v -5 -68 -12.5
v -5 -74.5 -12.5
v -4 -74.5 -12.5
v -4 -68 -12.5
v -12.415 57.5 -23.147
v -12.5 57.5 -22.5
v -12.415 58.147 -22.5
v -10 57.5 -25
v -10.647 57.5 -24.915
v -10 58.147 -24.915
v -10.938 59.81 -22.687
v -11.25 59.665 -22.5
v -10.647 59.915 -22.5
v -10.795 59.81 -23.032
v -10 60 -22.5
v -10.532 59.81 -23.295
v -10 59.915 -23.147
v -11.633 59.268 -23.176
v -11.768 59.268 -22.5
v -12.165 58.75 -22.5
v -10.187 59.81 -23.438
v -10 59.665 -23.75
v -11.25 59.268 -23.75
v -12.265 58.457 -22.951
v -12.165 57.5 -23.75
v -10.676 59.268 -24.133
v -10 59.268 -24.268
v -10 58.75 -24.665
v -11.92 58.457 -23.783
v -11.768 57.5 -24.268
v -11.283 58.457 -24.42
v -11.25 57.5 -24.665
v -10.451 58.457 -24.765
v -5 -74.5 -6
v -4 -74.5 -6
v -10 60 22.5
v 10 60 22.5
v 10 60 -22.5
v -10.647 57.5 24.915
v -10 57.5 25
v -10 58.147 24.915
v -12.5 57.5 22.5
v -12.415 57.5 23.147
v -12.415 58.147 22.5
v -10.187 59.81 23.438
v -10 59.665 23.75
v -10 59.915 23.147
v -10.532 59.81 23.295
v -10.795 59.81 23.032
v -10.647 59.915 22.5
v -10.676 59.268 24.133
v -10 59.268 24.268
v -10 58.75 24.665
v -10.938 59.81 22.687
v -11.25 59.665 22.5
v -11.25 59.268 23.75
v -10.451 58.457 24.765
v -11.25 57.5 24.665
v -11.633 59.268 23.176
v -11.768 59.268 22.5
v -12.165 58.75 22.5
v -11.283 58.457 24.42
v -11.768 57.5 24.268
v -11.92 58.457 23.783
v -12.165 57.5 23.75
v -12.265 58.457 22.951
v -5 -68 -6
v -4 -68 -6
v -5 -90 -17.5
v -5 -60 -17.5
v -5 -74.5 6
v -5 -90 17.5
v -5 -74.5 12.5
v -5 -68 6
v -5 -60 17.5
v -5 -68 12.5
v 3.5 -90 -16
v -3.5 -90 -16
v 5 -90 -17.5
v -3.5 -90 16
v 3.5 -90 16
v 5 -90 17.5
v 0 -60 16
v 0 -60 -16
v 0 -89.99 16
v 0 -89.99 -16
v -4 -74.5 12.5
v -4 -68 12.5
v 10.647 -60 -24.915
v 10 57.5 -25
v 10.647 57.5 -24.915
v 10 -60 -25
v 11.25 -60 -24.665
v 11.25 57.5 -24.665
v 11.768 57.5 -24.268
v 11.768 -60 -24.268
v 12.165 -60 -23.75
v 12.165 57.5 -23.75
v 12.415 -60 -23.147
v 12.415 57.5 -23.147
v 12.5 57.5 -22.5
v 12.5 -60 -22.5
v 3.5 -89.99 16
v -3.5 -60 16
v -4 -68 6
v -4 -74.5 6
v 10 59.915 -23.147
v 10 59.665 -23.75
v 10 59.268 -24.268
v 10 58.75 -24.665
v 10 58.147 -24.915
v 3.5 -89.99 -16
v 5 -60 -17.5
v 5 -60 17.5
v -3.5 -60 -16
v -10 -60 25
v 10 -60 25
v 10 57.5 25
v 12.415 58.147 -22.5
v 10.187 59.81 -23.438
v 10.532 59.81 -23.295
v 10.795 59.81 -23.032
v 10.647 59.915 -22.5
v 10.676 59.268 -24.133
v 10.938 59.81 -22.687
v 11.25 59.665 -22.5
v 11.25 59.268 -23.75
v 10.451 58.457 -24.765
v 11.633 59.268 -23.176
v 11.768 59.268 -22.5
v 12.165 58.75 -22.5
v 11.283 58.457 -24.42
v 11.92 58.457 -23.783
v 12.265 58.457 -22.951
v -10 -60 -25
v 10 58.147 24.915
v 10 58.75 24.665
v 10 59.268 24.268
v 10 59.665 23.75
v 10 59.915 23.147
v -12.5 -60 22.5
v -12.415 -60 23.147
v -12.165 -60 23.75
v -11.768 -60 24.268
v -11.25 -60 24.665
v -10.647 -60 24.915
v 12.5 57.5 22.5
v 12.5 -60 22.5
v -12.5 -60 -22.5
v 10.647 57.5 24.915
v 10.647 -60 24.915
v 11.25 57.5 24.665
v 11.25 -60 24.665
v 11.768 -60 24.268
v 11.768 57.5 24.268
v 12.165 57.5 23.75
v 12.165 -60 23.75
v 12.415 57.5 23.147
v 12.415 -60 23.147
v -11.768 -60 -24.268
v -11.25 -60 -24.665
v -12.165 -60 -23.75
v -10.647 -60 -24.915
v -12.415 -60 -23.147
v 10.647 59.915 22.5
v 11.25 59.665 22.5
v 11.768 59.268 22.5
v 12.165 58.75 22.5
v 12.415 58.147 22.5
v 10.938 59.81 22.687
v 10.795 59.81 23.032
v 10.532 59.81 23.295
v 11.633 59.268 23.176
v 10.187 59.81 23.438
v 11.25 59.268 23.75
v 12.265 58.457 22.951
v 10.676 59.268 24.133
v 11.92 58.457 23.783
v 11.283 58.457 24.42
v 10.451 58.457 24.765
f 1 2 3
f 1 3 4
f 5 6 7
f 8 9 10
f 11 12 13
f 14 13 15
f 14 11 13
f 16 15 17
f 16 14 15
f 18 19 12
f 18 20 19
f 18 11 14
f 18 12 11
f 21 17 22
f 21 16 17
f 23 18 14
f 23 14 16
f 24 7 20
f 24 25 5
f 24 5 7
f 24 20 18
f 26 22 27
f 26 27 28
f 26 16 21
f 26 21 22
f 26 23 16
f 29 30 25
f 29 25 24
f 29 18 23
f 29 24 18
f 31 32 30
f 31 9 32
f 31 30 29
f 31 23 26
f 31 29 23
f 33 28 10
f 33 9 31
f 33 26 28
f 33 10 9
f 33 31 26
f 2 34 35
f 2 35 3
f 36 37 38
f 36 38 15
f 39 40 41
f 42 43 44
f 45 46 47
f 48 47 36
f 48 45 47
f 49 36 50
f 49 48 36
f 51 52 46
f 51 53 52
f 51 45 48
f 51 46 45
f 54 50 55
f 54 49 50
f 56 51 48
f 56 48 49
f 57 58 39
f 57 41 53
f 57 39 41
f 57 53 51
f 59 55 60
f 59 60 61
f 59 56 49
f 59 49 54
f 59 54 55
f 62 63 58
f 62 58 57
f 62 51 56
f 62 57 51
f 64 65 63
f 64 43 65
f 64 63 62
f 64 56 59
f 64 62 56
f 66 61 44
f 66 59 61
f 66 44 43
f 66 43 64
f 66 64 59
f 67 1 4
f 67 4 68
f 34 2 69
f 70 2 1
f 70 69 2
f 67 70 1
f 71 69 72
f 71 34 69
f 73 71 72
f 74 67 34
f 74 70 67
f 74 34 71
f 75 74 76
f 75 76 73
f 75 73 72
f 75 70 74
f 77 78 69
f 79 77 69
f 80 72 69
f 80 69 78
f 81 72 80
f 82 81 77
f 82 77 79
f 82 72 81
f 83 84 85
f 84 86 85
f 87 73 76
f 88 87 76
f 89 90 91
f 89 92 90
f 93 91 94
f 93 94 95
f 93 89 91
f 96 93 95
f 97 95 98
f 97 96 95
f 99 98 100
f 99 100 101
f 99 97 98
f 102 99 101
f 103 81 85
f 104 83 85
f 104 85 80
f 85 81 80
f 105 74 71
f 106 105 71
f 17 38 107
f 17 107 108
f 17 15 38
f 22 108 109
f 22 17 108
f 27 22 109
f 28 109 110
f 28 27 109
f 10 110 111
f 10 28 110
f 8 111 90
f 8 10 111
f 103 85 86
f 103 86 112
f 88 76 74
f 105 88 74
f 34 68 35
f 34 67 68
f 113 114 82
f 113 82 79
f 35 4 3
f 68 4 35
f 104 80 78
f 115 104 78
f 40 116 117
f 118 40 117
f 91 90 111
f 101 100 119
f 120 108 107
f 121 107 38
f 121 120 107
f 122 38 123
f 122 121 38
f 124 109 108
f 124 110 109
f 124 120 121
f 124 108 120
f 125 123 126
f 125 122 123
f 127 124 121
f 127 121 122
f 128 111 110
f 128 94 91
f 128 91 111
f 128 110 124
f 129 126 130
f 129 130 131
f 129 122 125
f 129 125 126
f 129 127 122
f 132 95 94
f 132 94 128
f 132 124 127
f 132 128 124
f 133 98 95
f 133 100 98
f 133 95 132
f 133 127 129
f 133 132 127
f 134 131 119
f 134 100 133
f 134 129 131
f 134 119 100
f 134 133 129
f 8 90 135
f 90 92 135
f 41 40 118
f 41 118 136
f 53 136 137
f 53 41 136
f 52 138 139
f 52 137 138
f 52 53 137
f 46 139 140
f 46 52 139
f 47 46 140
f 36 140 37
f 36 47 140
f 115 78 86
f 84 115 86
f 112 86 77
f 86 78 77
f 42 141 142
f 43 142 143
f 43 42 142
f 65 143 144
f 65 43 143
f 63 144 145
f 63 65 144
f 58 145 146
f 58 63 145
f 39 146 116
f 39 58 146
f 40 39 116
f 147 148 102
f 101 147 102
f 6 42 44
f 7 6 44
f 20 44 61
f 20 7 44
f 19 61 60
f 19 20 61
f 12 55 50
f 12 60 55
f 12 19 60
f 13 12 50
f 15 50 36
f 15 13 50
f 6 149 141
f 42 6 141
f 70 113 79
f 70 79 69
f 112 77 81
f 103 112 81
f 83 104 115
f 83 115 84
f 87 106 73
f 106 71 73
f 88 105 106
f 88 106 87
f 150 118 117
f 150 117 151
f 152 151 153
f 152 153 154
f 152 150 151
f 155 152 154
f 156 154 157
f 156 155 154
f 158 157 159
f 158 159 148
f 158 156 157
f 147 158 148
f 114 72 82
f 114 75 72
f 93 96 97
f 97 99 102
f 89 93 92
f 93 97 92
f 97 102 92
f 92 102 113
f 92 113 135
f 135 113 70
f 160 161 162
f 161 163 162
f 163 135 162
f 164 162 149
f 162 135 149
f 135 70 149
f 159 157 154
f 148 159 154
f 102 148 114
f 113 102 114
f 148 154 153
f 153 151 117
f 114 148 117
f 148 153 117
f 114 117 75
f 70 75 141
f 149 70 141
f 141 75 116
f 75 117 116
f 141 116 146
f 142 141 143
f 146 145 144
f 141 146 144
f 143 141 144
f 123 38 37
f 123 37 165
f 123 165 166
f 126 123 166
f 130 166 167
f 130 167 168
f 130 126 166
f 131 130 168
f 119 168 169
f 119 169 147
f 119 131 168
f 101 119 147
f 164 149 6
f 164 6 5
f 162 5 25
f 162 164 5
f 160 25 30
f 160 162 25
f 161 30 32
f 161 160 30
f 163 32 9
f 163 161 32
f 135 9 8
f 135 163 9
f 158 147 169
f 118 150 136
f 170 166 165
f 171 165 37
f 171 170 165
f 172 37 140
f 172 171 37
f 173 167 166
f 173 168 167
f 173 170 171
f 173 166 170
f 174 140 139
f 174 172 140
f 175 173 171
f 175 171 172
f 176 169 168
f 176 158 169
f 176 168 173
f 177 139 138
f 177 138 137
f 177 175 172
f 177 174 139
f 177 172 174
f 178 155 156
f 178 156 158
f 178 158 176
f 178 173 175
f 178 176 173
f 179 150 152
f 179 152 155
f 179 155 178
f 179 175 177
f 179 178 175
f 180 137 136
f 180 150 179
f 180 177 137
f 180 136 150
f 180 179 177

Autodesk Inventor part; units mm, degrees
ref_plane "YZ Plane" through (0, 0, 0) normal (1, 0, 0) x (0, 1, 0)
ref_plane "XZ Plane" through (0, 0, 0) normal (0, 1, 0) x (-1, 0, 0)
ref_plane "XY Plane" through (0, 0, 0) normal (0, 0, 1) x (1, 0, 0)
sketch "Sketch1" plane through (0, 0, 0) normal (0, 1, 0) x (-1, 0, 0)
  line L0 (12.5, 25) -> (-12.5, 25)
  line L1 (-12.5, 25) -> (-12.5, -25)
  line L2 (-12.5, -25) -> (12.5, -25)
  line L3 (12.5, -25) -> (12.5, 25)
  line L4 (17.5, 0) -> (-17.5, 0) projected
  line L5 (0, -35) -> (0, 35) projected
  point P0 (0, 0)
  point P1 (12.5, 0)
  point P2 (0, -25)
  dimension "d0" = 50
  dimension "d1" = 25
extrude "Extrusion1" add sketch "Sketch1" along normal mid plane 120
sketch "Sketch2" plane through (0, -60, 0) normal (0, -1, 0) x (1, 0, 0)
  line L0 (-12.5, -25) -> (12.5, -25) projected
  line L1 (12.5, -25) -> (12.5, 25) projected
  line L2 (12.5, 25) -> (-12.5, 25) projected
  line L3 (-12.5, 25) -> (-12.5, -25) projected
  line L4 (5, 17.5) -> (5, -17.5)
  line L5 (5, -17.5) -> (-5, -17.5)
  line L6 (-5, -17.5) -> (-5, 17.5)
  line L7 (-5, 17.5) -> (5, 17.5)
  point P0 (0, 0)
  dimension "d4" = 10
extrude "Extrusion2" add sketch "Sketch2" along normal blind 30 contours L4 L5 L6 L7
sketch "Sketch3" plane through (0, -90, 0) normal (0, -1, 0) x (1, 0, 0)
  line L0 (5, -17.5) -> (5, 17.5) projected
  line L1 (5, 17.5) -> (-5, 17.5) projected
  line L2 (-5, 17.5) -> (-5, -17.5) projected
  line L3 (-5, -17.5) -> (5, -17.5) projected
  line L4 (-3.5, -16) -> (0, -16)
  line L5 (0, -16) -> (0, 16)
  line L6 (0, 16) -> (-3.5, 16)
  line L7 (-3.5, 16) -> (-3.5, -16)
  line L8 (-17.5, 0) -> (17.5, 0) projected
  line L9 (0, -35) -> (0, 35) projected
  point P0 (0, 0)
  point P1 (-3.5, 0)
  dimension "d7" = 1.5
  dimension "d8" = 1.5
extrude "Extrusion3" cut sketch "Sketch3" against normal blind 30 contours L8 L7 L6 L5 | L5 L4 L7 L8
sketch "Sketch4" plane through (-5, -60, -17.5) normal (-1, 0, 0) x (0, 0, 1)
  line L0 (0, 0) -> (35, 0) projected
  line L1 (0, 0) -> (0, -30) projected
  line L2 (35, -30) -> (0, -30) projected
  line L3 (35, 0) -> (35, -30) projected
  line L4 (17.5, -60) -> (17.5, 150) projected
  line L5 (5, -8) -> (11.5, -8)
  line L6 (11.5, -8) -> (11.5, -14.5)
  line L7 (11.5, -14.5) -> (5, -14.5)
  line L8 (5, -14.5) -> (5, -8)
  line L9 (30, -8) -> (23.5, -8)
  line L10 (23.5, -8) -> (23.5, -14.5)
  line L11 (23.5, -14.5) -> (30, -14.5)
  line L12 (30, -14.5) -> (30, -8)
  point P0 (17.5, 60)
  dimension "d11" = 6.5
  dimension "d12" = 6
  dimension "d13" = 8
extrude "Extrusion4" cut sketch "Sketch4" against normal blind 1 contours L5 L6 L7 L8 | L12 L11 L10 L9
fillet "Fillet1" radius 2.5 8 edges at (-12.5, 0, 25) (-12.5, 0, -25) (12.5, 0, 25) (12.5, 0, -25) (0, 60, 25) (-12.5, 60, 0) (0, 60, -25) (12.5, 60, 0)
sketch "Sketch5" plane through (0, -90, 0) normal (0, -1, 0) x (1, 0, 0)
  line L0 (0, -16) -> (-3.5, -16) projected
  line L1 (-3.5, -16) -> (-3.5, 16) projected
  line L2 (-3.5, 16) -> (0, 16) projected
  line L3 (0, 16) -> (0, -16) projected
  line L4 (5, -17.5) -> (5, 17.5) projected
  line L5 (5, 17.5) -> (-5, 17.5) projected
  line L6 (-5, 17.5) -> (-5, -17.5) projected
  line L7 (-5, -17.5) -> (5, -17.5) projected
  line L8 (0, -16) -> (3.5, -16)
  line L9 (3.5, -16) -> (3.5, 16)
  line L10 (3.5, 16) -> (0, 16)
  line L11 (0, 16) -> (0, -16)
  point P0 (0, 0)
  dimension "d17" = 1.5
  dimension "d18" = 1.5
extrude "Extrusion5" cut sketch "Sketch5" against normal blind 0.01 contours L3 L10 L9 L8
properties part number "USB_Stick" material "ABS Plastic"
